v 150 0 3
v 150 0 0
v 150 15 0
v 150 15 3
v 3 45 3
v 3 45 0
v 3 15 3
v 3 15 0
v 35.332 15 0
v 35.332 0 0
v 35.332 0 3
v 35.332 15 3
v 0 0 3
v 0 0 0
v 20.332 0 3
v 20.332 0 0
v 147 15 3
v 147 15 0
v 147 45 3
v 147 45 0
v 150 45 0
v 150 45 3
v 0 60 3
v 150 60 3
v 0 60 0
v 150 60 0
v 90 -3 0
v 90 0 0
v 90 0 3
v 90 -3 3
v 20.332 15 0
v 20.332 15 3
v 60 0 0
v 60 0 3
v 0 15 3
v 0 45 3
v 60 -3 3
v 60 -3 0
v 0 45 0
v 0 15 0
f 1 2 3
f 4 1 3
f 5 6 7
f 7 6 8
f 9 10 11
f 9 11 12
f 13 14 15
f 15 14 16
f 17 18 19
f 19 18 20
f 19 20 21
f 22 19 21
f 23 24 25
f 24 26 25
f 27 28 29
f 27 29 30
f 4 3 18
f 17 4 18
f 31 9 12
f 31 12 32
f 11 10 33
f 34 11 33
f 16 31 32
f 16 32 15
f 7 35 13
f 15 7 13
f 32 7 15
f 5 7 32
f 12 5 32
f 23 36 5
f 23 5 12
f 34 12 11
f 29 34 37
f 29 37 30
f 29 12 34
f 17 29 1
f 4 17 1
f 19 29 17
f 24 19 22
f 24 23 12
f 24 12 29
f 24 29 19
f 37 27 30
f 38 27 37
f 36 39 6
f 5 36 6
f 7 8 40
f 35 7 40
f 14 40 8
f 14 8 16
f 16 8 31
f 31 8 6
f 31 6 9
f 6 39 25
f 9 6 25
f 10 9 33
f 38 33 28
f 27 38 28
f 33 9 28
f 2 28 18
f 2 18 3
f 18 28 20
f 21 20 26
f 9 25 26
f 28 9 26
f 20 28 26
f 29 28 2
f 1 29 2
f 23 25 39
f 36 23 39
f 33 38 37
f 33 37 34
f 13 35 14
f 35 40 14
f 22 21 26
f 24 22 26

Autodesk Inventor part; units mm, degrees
ref_plane "YZ Plane" through (0, 0, 0) normal (1, 0, 0) x (0, 1, 0)
ref_plane "XZ Plane" through (0, 0, 0) normal (0, 1, 0) x (-1, 0, 0)
ref_plane "XY Plane" through (0, 0, 0) normal (0, 0, 1) x (1, 0, 0)
sketch "Sketch1" plane through (0, 0, 0) normal (0, 0, 1) x (1, 0, 0)
  line L0 (90, 0) -> (90, -3)
  line L1 (60, -3) -> (60, 0)
  line L2 (0, 60) -> (0, 45)
  line L3 (3, 45) -> (3, 15)
  line L4 (0, 45) -> (3, 45)
  line L5 (3, 15) -> (0, 15)
  line L6 (0, 15) -> (0, 0)
  line L7 (90, -3) -> (60, -3)
  line L8 (90, 0) -> (150, 0)
  line L9 (150, 60) -> (0, 60)
  line L10 (150, 15) -> (147, 15)
  line L11 (147, 15) -> (147, 45)
  line L12 (147, 45) -> (150, 45)
  line L13 (150, 0) -> (150, 15)
  line L14 (150, 45) -> (150, 60)
  line L15 (35.3315, 0) -> (35.3315, 15)
  line L16 (35.3315, 15) -> (20.3315, 15)
  line L17 (20.3315, 15) -> (20.3315, 0)
  line L18 (0, 0) -> (20.3315, 0)
  line L19 (35.3315, 0) -> (60, 0)
  dimension "d10" = 150
  dimension "d11" = 60
  dimension "d12" = 3
  dimension "d13" = 15
  dimension "d14" = 3
  dimension "d15" = 30
  dimension "d16" = 30
  dimension "d17" = 3
  dimension "d18" = 3
  dimension "d19" = 15
extrude "Extrusion1" add sketch "Sketch1" along normal blind 3
properties part number "atas"
